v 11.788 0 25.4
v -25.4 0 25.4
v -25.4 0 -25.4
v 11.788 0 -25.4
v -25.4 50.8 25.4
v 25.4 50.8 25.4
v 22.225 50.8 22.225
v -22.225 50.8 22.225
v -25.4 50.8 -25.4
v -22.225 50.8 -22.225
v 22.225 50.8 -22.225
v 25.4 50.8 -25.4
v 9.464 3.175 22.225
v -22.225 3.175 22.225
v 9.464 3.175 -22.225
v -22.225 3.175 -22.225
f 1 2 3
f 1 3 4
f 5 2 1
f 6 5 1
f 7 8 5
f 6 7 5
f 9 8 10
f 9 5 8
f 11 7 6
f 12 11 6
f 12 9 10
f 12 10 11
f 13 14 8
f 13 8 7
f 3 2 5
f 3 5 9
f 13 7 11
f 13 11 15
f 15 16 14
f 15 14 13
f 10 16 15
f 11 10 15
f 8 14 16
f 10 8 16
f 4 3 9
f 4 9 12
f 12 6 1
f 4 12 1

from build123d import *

# Parameters (mm, degrees)
SKETCH10_W          = 50.8
SKETCH10_H          = 50.8
BOSS_EXTRUDE4_DEPTH = 50.8
CUT_EXTRUDE6_DEPTH  = 77.2
SKETCH19_W          = 44.45
SKETCH19_H          = 44.45
CUT_EXTRUDE8_DEPTH  = 47.625
BOSS_EXTRUDE6_DEPTH = 47.625


with BuildPart() as part:
    # Sketch10 → Boss-Extrude4 (new body)
    with BuildSketch(Plane(origin=(0, 0, 0), x_dir=(1, 0, 0), z_dir=(0, 1, 0))):
        Rectangle(SKETCH10_W, SKETCH10_H)
    extrude(amount=BOSS_EXTRUDE4_DEPTH)

    # Sketch17 → Cut-Extrude6 (cut, through all)
    with BuildSketch(Plane.XY.offset(25.4)):
        Polygon((25.4, 0), (25.4, 50.8), (11.788181024, 0), align=None)
    extrude(amount=-CUT_EXTRUDE6_DEPTH, mode=Mode.SUBTRACT)

    # Sketch19 → Cut-Extrude8 (cut)
    with BuildSketch(Plane(origin=(0, 50.8, 0), x_dir=(1, 0, 0), z_dir=(0, 1, 0))):
        Rectangle(SKETCH19_W, SKETCH19_H)
    extrude(amount=-CUT_EXTRUDE8_DEPTH, mode=Mode.SUBTRACT)

    # Sketch20 → Boss-Extrude6 (add)
    with BuildSketch(Plane.XY.offset(25.4)):
        Polygon((22.225, 50.8), (8.613181024, 0), (11.788181024, 0), (25.4, 50.8), align=None)
    extrude(amount=-BOSS_EXTRUDE6_DEPTH)


solid = part.part
